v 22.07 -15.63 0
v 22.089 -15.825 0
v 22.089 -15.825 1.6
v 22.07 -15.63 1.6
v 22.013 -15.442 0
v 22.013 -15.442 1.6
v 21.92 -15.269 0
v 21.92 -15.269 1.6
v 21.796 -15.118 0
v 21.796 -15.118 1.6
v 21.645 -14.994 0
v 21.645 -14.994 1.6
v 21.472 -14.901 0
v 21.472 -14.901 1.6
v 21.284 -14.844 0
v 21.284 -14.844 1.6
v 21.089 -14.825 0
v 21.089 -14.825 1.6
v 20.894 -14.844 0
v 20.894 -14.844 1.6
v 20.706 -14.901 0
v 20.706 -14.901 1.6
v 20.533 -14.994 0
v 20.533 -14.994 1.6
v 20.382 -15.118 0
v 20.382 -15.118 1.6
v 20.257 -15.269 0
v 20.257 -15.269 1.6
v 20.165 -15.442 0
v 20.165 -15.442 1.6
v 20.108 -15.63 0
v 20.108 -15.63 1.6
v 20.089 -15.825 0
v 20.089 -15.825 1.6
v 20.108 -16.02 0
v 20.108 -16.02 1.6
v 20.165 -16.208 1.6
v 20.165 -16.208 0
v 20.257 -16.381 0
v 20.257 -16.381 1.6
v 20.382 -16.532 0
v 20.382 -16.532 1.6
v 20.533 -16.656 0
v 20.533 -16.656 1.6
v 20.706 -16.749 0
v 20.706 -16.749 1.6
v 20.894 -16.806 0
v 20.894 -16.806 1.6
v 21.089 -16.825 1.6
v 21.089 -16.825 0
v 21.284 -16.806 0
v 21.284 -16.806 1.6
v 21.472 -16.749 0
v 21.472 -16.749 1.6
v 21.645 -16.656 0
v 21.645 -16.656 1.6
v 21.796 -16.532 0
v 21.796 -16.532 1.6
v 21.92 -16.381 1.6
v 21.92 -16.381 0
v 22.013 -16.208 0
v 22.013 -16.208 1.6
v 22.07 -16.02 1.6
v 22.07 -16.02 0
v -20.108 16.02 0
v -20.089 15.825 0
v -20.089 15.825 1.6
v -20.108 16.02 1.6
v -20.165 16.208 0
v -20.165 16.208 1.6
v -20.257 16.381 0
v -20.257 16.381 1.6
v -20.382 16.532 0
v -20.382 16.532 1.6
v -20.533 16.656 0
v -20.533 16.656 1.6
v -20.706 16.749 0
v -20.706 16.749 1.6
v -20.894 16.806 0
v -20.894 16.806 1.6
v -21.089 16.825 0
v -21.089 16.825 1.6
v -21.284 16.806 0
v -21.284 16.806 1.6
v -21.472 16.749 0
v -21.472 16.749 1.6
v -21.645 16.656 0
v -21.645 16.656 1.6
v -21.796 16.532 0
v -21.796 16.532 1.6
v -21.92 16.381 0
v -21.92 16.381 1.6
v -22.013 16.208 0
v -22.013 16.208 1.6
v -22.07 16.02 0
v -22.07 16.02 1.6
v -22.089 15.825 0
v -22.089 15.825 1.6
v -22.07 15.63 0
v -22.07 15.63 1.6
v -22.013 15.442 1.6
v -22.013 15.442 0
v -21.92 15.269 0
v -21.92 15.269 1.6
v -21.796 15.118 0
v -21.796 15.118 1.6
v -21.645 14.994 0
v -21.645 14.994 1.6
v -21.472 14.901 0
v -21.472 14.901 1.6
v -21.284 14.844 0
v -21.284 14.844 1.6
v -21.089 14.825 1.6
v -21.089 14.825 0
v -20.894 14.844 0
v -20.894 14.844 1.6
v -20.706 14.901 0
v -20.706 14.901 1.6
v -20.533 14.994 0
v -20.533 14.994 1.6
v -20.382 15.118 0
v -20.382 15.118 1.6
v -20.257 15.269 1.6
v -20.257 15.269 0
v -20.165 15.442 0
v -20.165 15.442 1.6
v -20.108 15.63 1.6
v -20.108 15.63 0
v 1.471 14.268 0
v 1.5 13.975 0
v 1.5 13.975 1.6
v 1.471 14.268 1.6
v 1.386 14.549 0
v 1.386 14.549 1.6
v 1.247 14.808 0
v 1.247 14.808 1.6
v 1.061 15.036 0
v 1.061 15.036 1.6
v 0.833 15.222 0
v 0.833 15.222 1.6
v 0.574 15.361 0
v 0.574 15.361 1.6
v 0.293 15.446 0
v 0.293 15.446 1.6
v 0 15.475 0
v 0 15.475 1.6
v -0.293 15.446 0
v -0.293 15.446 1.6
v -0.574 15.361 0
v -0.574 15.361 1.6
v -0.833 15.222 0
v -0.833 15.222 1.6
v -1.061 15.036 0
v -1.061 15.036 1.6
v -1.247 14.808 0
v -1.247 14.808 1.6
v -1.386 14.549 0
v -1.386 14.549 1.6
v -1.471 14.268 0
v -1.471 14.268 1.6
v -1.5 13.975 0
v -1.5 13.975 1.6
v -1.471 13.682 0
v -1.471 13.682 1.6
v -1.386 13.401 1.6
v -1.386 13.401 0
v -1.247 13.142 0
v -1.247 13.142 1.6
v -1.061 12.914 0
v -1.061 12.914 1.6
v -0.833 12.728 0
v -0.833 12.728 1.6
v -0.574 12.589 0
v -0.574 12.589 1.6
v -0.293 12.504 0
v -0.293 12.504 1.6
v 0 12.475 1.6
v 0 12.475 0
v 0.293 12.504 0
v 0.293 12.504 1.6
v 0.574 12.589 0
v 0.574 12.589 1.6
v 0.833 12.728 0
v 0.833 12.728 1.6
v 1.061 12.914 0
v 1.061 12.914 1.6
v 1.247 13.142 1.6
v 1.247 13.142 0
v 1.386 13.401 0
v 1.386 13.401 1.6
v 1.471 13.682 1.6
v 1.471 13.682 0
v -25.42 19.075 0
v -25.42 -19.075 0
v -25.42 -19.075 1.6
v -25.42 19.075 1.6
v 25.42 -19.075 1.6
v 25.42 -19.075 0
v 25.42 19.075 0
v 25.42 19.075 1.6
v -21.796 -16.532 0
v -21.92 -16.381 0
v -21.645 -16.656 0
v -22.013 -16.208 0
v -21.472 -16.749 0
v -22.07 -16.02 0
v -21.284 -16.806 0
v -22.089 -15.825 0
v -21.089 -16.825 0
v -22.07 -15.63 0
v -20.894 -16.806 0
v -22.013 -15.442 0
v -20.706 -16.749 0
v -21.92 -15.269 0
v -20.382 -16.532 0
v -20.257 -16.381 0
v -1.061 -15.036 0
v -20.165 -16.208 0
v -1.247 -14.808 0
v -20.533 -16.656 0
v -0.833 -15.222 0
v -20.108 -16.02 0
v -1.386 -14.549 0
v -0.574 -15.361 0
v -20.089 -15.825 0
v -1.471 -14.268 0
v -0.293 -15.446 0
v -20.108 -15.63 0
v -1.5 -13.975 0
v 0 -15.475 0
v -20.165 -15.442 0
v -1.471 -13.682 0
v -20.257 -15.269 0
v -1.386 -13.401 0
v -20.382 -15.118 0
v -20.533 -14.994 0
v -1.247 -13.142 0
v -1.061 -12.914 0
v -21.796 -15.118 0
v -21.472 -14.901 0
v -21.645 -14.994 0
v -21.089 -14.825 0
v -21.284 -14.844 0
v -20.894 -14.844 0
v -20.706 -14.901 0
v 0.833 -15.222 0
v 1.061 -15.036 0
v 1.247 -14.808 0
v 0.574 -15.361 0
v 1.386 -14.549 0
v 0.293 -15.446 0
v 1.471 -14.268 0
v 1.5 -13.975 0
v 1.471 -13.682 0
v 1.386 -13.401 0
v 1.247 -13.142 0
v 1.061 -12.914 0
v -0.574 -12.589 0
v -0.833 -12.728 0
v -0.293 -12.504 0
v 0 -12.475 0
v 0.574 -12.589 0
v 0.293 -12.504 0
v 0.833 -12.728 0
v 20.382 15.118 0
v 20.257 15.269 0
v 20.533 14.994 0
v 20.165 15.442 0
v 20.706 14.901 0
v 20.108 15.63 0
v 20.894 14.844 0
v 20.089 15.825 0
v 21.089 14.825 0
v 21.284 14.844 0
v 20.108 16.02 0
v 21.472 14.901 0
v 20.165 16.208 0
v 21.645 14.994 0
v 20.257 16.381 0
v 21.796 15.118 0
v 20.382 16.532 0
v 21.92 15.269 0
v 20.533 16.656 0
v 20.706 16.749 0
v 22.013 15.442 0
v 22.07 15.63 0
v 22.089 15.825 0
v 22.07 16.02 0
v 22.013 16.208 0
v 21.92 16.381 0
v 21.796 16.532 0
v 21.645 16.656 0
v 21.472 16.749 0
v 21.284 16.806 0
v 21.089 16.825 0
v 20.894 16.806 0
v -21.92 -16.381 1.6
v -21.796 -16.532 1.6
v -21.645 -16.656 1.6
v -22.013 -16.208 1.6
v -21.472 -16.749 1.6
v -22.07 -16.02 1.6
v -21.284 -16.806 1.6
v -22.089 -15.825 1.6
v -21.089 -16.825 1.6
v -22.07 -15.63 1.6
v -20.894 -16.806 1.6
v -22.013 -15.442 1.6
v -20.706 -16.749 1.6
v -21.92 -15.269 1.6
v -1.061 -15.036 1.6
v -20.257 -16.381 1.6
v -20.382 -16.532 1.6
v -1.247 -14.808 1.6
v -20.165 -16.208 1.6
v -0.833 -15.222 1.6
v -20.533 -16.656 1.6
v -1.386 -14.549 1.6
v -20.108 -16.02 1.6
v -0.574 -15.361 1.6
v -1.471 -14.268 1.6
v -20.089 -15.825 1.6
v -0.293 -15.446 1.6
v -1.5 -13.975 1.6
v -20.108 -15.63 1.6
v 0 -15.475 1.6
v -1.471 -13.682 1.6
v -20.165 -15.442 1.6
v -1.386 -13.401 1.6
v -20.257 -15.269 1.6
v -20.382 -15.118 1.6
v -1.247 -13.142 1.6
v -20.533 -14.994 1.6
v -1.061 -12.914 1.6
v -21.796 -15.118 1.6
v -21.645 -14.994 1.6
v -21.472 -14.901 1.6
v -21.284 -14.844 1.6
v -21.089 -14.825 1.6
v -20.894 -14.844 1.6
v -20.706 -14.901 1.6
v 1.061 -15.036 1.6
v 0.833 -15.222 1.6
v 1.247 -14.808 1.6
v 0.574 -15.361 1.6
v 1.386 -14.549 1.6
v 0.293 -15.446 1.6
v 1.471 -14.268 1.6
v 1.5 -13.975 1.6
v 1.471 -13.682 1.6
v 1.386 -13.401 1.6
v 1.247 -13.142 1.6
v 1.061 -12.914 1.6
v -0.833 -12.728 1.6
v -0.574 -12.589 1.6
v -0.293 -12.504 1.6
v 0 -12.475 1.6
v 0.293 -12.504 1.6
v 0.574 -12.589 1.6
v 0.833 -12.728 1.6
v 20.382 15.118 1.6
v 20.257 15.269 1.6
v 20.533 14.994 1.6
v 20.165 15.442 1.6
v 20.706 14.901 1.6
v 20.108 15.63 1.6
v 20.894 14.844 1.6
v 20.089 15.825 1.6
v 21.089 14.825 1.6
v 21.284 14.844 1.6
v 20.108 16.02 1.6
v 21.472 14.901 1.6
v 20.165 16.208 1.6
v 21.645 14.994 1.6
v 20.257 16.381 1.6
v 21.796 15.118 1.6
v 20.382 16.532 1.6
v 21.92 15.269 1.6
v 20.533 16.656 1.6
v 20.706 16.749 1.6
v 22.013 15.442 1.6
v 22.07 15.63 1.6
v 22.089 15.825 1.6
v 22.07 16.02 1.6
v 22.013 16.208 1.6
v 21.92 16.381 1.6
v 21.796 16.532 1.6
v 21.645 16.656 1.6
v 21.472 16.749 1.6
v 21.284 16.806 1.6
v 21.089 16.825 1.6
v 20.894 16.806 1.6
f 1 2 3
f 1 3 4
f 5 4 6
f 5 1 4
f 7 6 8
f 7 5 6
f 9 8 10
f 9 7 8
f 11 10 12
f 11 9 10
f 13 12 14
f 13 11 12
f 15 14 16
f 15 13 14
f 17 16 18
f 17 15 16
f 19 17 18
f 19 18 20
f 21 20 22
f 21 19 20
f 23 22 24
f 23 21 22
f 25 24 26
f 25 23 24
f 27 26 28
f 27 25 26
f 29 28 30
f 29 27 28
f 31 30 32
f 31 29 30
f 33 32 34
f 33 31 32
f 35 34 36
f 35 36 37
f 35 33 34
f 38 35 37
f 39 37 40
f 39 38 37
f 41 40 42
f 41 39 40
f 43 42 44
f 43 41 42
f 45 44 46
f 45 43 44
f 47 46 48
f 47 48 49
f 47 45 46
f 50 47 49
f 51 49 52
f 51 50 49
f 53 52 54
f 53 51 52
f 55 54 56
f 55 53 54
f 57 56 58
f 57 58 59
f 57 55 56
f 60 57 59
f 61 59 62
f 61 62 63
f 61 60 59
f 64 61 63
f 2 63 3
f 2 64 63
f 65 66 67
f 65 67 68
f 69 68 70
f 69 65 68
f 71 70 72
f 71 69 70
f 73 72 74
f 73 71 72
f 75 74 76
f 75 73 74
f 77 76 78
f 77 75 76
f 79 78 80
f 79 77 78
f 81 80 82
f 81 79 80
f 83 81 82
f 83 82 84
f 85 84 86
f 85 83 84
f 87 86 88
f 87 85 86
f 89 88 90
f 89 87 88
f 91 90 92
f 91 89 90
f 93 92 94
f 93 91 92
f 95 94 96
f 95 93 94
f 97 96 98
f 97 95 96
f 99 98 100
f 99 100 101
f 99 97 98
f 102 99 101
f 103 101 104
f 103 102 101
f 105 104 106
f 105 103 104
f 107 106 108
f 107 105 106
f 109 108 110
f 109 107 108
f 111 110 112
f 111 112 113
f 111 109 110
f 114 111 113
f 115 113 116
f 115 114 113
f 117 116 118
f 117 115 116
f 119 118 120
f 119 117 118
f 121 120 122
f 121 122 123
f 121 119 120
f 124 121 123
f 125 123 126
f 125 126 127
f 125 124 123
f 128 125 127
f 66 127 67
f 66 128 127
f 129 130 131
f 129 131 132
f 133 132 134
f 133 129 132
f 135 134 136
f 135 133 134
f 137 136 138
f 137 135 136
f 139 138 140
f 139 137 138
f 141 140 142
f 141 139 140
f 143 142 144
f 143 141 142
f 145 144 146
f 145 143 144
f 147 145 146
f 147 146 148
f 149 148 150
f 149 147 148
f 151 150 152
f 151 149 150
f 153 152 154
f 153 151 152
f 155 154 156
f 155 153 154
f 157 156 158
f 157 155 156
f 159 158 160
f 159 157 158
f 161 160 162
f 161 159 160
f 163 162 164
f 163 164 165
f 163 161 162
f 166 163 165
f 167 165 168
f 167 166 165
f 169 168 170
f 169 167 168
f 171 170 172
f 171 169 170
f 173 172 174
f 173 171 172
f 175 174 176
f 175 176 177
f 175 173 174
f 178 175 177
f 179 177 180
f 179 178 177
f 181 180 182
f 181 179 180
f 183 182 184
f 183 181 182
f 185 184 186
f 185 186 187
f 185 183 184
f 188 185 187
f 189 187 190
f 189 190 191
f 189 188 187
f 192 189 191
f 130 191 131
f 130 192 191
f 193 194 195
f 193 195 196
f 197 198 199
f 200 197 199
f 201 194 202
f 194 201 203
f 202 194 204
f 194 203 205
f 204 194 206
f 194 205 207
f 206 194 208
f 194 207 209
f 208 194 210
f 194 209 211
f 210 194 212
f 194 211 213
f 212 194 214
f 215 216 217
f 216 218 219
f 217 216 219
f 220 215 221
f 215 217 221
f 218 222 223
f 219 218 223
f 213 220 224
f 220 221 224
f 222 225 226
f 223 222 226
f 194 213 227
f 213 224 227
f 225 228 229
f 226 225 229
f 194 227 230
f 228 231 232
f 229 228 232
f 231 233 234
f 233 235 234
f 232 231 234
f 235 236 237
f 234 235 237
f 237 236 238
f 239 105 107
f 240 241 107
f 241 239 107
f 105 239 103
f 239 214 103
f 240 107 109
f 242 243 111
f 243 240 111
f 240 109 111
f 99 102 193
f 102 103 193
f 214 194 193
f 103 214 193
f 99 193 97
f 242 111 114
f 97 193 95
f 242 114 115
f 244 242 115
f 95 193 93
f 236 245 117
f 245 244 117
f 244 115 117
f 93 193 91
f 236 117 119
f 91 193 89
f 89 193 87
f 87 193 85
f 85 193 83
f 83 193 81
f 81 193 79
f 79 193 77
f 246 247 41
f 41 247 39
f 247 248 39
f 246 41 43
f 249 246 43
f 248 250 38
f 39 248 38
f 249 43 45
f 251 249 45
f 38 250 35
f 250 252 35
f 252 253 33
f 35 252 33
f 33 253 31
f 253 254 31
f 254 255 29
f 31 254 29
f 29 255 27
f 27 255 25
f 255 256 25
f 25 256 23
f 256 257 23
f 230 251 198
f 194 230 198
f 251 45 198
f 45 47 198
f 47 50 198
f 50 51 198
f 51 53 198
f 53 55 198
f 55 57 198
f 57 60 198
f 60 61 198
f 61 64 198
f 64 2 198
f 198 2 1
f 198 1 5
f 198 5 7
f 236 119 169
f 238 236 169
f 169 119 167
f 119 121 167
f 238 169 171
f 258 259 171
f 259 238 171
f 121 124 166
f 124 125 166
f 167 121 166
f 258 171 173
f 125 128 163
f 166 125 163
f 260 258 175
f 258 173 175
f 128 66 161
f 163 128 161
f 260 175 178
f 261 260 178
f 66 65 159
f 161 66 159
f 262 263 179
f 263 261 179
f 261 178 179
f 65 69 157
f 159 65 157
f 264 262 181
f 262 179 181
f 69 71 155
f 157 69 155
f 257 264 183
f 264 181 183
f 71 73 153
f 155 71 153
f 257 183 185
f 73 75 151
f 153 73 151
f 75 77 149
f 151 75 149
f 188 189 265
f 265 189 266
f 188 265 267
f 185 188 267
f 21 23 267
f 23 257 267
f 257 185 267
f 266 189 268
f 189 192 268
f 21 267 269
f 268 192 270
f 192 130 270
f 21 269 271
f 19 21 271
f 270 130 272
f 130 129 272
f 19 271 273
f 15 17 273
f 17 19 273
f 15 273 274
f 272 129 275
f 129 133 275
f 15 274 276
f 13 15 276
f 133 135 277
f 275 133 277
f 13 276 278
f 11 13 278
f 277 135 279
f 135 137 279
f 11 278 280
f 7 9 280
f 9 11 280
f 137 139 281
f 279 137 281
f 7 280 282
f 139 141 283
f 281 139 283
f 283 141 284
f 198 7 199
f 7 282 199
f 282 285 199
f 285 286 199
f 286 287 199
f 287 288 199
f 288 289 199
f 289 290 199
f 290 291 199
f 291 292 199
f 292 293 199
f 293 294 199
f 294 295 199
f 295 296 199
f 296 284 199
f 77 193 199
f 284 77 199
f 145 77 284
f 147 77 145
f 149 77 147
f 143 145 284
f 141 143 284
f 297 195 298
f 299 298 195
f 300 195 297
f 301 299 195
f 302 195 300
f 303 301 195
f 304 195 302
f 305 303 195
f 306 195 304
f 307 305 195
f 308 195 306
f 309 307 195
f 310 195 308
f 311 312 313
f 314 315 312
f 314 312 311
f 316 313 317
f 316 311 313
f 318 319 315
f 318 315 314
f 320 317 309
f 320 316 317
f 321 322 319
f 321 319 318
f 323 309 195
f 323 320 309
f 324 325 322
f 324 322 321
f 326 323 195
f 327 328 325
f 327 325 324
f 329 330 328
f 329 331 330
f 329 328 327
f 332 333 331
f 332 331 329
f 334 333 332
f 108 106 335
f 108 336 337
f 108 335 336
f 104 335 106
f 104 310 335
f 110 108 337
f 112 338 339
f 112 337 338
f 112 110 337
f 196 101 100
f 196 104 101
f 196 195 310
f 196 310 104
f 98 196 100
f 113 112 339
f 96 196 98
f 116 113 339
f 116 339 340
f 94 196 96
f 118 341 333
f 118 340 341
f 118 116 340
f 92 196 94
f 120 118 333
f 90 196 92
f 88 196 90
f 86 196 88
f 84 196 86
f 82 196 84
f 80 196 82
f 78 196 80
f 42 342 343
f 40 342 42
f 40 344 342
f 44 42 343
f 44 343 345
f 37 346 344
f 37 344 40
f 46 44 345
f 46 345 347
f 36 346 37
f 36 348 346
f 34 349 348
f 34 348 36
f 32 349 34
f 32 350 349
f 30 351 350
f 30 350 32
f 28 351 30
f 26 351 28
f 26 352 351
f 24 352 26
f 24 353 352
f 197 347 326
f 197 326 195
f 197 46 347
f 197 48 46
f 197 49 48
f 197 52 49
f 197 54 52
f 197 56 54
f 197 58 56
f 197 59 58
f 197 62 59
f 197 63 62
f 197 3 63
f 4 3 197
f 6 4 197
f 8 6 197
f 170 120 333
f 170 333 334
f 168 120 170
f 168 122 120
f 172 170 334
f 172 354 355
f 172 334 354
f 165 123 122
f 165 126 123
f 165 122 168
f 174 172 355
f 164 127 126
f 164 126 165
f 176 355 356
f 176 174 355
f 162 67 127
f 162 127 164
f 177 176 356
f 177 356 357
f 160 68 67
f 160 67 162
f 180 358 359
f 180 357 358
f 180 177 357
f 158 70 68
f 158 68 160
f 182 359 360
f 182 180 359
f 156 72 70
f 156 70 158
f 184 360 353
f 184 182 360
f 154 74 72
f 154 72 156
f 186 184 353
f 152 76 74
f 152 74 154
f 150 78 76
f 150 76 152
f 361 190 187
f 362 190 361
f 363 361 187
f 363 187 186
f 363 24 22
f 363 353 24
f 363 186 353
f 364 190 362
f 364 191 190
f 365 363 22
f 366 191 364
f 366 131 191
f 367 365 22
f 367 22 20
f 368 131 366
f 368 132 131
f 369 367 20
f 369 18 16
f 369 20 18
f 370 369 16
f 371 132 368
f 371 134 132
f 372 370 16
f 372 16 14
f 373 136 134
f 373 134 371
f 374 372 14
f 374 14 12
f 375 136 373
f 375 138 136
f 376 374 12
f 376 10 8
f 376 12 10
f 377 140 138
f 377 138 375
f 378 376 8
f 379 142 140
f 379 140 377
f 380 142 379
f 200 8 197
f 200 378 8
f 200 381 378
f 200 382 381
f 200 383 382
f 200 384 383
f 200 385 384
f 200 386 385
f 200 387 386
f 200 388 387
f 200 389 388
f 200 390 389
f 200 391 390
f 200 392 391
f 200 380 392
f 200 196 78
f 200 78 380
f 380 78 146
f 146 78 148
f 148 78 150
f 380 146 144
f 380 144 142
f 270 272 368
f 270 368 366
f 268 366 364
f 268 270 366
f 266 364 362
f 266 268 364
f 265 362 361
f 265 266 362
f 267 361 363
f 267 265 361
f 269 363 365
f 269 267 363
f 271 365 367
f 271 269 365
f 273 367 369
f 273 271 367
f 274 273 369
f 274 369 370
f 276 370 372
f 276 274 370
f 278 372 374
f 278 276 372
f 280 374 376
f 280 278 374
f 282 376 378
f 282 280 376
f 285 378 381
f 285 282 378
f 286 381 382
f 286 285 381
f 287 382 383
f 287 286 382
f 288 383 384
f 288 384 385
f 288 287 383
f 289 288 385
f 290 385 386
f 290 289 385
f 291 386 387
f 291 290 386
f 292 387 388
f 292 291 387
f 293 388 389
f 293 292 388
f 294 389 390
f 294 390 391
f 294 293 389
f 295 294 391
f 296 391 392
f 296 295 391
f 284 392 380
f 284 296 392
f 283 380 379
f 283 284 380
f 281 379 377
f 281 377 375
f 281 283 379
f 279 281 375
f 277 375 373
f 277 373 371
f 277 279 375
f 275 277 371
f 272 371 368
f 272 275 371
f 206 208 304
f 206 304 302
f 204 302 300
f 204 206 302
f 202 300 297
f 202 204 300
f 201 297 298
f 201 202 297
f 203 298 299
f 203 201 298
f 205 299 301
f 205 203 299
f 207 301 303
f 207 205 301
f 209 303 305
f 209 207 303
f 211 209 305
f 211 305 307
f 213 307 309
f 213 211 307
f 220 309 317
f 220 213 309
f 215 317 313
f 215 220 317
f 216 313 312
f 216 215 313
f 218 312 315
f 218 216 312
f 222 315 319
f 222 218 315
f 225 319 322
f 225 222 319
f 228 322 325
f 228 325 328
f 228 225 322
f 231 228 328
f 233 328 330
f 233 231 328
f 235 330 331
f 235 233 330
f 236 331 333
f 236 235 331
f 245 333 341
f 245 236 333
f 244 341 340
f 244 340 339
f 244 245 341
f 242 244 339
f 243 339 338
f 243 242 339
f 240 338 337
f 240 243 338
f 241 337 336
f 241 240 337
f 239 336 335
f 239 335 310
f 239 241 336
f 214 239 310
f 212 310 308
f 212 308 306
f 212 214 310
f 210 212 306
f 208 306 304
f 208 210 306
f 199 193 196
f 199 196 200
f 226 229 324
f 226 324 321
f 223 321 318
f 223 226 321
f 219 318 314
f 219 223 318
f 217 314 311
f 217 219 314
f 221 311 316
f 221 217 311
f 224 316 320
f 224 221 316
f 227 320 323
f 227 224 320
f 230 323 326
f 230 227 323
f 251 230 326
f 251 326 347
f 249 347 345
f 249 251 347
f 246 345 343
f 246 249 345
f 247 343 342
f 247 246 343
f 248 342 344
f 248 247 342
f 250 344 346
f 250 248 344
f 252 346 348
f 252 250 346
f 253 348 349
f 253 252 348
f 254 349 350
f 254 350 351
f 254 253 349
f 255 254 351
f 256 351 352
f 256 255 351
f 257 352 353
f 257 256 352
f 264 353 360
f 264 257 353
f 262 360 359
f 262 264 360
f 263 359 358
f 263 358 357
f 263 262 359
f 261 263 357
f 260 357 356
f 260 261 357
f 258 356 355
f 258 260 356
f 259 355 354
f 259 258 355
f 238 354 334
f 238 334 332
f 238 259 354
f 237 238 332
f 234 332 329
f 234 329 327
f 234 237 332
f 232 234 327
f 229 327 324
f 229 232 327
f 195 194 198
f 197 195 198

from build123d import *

# Parameters (mm, degrees)
SKETCH1_W           = 50.84
SKETCH1_H           = 38.15
SKETCH1_R           = 1.5
SKETCH1_R_2         = 1
BOSS_EXTRUDE1_DEPTH = 1.6


with BuildPart() as part:
    # Sketch1 → Boss-Extrude1 (new body)
    with BuildSketch(Plane.XY):
        Rectangle(SKETCH1_W, SKETCH1_H)
        with Locations((0, 13.975)):
            Circle(SKETCH1_R, mode=Mode.SUBTRACT)
        with Locations(Location((0, -13.975, 0), (0, 0, 180))):
            Circle(SKETCH1_R, mode=Mode.SUBTRACT)
        with Locations((-21.088938401, 15.825)):
            Circle(SKETCH1_R_2, mode=Mode.SUBTRACT)
        with Locations(Location((21.088938401, 15.825, 0), (0, 0, 180))):
            Circle(SKETCH1_R_2, mode=Mode.SUBTRACT)
        with Locations((21.088938401, -15.825)):
            Circle(SKETCH1_R_2, mode=Mode.SUBTRACT)
        with Locations(Location((-21.088938401, -15.825, 0), (0, 0, 180))):
            Circle(SKETCH1_R_2, mode=Mode.SUBTRACT)
    extrude(amount=BOSS_EXTRUDE1_DEPTH)


solid = part.part
